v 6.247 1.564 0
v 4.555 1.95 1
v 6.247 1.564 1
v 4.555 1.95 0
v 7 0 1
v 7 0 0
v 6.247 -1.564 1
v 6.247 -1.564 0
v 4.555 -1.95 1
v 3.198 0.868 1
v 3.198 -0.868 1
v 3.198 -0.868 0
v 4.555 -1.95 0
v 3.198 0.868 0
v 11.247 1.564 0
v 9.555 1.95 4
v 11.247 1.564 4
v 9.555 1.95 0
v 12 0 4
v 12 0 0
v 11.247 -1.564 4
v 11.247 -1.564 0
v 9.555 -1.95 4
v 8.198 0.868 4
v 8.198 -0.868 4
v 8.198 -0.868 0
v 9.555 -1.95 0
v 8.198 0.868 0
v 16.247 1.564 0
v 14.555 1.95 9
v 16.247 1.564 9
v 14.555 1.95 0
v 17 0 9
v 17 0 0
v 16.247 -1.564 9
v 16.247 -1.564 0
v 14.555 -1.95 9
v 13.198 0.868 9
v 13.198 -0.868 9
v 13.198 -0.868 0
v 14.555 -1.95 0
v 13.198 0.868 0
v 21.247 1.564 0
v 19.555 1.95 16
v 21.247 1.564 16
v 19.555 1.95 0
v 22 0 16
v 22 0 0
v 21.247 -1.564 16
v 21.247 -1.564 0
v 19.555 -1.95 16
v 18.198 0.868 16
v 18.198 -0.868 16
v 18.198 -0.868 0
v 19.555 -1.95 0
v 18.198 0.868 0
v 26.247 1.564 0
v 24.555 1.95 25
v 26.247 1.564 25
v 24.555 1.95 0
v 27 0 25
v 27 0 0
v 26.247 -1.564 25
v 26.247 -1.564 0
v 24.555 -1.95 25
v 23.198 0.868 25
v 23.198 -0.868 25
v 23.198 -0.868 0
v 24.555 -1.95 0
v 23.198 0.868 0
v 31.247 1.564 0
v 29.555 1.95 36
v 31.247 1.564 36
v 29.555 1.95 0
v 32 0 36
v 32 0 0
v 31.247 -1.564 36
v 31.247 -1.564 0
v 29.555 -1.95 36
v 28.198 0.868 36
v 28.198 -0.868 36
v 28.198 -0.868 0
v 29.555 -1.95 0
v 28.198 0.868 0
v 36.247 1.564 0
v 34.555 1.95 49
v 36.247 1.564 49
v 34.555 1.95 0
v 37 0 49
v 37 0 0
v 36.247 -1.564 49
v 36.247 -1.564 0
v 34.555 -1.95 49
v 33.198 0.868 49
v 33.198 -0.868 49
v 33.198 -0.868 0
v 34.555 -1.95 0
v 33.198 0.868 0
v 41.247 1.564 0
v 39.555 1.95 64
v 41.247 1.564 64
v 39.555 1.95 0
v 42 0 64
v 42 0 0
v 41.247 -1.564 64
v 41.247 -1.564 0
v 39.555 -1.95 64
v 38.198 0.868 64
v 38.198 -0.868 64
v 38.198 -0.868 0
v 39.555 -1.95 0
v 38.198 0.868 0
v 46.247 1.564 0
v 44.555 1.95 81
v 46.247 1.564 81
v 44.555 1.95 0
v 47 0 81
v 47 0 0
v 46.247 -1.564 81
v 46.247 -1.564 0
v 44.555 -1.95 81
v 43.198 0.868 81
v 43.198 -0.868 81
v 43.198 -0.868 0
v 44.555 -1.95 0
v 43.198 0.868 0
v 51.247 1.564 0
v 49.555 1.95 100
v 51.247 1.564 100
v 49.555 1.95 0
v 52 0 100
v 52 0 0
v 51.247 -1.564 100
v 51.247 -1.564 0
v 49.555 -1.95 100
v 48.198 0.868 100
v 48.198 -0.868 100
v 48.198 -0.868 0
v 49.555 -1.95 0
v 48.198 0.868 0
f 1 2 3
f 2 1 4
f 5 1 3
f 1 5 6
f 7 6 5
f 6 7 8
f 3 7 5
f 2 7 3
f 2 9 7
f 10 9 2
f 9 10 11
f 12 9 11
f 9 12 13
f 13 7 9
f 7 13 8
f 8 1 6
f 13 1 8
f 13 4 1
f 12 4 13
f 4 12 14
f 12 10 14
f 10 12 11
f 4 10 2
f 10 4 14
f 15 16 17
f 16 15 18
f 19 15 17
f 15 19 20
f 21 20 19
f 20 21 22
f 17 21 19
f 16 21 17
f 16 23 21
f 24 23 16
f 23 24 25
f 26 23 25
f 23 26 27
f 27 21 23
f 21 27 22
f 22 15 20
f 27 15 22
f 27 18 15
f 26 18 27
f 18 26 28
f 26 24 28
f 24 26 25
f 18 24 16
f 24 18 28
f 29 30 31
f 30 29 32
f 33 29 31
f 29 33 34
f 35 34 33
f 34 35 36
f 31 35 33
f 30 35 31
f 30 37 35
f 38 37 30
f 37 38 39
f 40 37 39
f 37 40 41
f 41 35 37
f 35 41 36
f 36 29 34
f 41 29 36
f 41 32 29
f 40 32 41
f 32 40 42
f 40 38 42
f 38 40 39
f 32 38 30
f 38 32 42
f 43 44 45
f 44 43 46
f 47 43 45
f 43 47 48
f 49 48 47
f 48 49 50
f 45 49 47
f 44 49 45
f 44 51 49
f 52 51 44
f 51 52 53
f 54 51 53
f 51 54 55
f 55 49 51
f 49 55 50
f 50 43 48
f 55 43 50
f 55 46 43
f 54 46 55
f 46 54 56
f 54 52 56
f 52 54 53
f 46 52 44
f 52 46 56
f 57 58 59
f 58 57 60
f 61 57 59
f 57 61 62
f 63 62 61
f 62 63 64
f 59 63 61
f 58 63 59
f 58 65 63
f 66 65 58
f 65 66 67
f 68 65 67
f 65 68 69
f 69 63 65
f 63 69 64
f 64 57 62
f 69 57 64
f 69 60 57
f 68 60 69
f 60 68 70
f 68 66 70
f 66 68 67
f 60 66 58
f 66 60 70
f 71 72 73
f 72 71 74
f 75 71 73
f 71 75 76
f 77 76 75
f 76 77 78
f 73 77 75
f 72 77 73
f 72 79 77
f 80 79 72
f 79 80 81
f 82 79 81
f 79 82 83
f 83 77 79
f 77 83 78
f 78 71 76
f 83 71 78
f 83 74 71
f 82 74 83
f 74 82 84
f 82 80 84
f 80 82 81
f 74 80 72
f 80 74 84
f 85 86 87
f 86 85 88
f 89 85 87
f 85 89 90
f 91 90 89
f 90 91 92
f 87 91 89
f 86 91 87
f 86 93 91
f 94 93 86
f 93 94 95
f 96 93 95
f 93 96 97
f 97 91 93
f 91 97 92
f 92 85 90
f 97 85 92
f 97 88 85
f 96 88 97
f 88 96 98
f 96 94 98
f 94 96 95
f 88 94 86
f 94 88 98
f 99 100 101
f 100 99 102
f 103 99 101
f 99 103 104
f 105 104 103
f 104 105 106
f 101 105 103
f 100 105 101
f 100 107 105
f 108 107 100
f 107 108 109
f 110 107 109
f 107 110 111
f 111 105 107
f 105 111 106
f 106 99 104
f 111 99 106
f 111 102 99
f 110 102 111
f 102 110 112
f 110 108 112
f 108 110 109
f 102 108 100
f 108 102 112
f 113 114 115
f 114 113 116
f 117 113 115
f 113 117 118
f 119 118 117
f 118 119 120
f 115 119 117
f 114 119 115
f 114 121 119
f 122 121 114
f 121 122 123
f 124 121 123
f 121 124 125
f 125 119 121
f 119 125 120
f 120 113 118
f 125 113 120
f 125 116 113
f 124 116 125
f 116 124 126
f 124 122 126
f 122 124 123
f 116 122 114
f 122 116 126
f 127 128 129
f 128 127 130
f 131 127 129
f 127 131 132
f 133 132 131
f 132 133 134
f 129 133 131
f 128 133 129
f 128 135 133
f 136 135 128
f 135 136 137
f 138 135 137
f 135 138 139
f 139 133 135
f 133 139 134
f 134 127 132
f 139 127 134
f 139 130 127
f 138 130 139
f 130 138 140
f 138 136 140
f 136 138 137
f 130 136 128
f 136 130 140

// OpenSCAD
for (x=[1:1:10]) {
  height = x*x;
  x_position = 5*x;
  translate([x_position, 0, 0]) {
    cylinder(h=height, r1=2, r2=2);
  }
}
